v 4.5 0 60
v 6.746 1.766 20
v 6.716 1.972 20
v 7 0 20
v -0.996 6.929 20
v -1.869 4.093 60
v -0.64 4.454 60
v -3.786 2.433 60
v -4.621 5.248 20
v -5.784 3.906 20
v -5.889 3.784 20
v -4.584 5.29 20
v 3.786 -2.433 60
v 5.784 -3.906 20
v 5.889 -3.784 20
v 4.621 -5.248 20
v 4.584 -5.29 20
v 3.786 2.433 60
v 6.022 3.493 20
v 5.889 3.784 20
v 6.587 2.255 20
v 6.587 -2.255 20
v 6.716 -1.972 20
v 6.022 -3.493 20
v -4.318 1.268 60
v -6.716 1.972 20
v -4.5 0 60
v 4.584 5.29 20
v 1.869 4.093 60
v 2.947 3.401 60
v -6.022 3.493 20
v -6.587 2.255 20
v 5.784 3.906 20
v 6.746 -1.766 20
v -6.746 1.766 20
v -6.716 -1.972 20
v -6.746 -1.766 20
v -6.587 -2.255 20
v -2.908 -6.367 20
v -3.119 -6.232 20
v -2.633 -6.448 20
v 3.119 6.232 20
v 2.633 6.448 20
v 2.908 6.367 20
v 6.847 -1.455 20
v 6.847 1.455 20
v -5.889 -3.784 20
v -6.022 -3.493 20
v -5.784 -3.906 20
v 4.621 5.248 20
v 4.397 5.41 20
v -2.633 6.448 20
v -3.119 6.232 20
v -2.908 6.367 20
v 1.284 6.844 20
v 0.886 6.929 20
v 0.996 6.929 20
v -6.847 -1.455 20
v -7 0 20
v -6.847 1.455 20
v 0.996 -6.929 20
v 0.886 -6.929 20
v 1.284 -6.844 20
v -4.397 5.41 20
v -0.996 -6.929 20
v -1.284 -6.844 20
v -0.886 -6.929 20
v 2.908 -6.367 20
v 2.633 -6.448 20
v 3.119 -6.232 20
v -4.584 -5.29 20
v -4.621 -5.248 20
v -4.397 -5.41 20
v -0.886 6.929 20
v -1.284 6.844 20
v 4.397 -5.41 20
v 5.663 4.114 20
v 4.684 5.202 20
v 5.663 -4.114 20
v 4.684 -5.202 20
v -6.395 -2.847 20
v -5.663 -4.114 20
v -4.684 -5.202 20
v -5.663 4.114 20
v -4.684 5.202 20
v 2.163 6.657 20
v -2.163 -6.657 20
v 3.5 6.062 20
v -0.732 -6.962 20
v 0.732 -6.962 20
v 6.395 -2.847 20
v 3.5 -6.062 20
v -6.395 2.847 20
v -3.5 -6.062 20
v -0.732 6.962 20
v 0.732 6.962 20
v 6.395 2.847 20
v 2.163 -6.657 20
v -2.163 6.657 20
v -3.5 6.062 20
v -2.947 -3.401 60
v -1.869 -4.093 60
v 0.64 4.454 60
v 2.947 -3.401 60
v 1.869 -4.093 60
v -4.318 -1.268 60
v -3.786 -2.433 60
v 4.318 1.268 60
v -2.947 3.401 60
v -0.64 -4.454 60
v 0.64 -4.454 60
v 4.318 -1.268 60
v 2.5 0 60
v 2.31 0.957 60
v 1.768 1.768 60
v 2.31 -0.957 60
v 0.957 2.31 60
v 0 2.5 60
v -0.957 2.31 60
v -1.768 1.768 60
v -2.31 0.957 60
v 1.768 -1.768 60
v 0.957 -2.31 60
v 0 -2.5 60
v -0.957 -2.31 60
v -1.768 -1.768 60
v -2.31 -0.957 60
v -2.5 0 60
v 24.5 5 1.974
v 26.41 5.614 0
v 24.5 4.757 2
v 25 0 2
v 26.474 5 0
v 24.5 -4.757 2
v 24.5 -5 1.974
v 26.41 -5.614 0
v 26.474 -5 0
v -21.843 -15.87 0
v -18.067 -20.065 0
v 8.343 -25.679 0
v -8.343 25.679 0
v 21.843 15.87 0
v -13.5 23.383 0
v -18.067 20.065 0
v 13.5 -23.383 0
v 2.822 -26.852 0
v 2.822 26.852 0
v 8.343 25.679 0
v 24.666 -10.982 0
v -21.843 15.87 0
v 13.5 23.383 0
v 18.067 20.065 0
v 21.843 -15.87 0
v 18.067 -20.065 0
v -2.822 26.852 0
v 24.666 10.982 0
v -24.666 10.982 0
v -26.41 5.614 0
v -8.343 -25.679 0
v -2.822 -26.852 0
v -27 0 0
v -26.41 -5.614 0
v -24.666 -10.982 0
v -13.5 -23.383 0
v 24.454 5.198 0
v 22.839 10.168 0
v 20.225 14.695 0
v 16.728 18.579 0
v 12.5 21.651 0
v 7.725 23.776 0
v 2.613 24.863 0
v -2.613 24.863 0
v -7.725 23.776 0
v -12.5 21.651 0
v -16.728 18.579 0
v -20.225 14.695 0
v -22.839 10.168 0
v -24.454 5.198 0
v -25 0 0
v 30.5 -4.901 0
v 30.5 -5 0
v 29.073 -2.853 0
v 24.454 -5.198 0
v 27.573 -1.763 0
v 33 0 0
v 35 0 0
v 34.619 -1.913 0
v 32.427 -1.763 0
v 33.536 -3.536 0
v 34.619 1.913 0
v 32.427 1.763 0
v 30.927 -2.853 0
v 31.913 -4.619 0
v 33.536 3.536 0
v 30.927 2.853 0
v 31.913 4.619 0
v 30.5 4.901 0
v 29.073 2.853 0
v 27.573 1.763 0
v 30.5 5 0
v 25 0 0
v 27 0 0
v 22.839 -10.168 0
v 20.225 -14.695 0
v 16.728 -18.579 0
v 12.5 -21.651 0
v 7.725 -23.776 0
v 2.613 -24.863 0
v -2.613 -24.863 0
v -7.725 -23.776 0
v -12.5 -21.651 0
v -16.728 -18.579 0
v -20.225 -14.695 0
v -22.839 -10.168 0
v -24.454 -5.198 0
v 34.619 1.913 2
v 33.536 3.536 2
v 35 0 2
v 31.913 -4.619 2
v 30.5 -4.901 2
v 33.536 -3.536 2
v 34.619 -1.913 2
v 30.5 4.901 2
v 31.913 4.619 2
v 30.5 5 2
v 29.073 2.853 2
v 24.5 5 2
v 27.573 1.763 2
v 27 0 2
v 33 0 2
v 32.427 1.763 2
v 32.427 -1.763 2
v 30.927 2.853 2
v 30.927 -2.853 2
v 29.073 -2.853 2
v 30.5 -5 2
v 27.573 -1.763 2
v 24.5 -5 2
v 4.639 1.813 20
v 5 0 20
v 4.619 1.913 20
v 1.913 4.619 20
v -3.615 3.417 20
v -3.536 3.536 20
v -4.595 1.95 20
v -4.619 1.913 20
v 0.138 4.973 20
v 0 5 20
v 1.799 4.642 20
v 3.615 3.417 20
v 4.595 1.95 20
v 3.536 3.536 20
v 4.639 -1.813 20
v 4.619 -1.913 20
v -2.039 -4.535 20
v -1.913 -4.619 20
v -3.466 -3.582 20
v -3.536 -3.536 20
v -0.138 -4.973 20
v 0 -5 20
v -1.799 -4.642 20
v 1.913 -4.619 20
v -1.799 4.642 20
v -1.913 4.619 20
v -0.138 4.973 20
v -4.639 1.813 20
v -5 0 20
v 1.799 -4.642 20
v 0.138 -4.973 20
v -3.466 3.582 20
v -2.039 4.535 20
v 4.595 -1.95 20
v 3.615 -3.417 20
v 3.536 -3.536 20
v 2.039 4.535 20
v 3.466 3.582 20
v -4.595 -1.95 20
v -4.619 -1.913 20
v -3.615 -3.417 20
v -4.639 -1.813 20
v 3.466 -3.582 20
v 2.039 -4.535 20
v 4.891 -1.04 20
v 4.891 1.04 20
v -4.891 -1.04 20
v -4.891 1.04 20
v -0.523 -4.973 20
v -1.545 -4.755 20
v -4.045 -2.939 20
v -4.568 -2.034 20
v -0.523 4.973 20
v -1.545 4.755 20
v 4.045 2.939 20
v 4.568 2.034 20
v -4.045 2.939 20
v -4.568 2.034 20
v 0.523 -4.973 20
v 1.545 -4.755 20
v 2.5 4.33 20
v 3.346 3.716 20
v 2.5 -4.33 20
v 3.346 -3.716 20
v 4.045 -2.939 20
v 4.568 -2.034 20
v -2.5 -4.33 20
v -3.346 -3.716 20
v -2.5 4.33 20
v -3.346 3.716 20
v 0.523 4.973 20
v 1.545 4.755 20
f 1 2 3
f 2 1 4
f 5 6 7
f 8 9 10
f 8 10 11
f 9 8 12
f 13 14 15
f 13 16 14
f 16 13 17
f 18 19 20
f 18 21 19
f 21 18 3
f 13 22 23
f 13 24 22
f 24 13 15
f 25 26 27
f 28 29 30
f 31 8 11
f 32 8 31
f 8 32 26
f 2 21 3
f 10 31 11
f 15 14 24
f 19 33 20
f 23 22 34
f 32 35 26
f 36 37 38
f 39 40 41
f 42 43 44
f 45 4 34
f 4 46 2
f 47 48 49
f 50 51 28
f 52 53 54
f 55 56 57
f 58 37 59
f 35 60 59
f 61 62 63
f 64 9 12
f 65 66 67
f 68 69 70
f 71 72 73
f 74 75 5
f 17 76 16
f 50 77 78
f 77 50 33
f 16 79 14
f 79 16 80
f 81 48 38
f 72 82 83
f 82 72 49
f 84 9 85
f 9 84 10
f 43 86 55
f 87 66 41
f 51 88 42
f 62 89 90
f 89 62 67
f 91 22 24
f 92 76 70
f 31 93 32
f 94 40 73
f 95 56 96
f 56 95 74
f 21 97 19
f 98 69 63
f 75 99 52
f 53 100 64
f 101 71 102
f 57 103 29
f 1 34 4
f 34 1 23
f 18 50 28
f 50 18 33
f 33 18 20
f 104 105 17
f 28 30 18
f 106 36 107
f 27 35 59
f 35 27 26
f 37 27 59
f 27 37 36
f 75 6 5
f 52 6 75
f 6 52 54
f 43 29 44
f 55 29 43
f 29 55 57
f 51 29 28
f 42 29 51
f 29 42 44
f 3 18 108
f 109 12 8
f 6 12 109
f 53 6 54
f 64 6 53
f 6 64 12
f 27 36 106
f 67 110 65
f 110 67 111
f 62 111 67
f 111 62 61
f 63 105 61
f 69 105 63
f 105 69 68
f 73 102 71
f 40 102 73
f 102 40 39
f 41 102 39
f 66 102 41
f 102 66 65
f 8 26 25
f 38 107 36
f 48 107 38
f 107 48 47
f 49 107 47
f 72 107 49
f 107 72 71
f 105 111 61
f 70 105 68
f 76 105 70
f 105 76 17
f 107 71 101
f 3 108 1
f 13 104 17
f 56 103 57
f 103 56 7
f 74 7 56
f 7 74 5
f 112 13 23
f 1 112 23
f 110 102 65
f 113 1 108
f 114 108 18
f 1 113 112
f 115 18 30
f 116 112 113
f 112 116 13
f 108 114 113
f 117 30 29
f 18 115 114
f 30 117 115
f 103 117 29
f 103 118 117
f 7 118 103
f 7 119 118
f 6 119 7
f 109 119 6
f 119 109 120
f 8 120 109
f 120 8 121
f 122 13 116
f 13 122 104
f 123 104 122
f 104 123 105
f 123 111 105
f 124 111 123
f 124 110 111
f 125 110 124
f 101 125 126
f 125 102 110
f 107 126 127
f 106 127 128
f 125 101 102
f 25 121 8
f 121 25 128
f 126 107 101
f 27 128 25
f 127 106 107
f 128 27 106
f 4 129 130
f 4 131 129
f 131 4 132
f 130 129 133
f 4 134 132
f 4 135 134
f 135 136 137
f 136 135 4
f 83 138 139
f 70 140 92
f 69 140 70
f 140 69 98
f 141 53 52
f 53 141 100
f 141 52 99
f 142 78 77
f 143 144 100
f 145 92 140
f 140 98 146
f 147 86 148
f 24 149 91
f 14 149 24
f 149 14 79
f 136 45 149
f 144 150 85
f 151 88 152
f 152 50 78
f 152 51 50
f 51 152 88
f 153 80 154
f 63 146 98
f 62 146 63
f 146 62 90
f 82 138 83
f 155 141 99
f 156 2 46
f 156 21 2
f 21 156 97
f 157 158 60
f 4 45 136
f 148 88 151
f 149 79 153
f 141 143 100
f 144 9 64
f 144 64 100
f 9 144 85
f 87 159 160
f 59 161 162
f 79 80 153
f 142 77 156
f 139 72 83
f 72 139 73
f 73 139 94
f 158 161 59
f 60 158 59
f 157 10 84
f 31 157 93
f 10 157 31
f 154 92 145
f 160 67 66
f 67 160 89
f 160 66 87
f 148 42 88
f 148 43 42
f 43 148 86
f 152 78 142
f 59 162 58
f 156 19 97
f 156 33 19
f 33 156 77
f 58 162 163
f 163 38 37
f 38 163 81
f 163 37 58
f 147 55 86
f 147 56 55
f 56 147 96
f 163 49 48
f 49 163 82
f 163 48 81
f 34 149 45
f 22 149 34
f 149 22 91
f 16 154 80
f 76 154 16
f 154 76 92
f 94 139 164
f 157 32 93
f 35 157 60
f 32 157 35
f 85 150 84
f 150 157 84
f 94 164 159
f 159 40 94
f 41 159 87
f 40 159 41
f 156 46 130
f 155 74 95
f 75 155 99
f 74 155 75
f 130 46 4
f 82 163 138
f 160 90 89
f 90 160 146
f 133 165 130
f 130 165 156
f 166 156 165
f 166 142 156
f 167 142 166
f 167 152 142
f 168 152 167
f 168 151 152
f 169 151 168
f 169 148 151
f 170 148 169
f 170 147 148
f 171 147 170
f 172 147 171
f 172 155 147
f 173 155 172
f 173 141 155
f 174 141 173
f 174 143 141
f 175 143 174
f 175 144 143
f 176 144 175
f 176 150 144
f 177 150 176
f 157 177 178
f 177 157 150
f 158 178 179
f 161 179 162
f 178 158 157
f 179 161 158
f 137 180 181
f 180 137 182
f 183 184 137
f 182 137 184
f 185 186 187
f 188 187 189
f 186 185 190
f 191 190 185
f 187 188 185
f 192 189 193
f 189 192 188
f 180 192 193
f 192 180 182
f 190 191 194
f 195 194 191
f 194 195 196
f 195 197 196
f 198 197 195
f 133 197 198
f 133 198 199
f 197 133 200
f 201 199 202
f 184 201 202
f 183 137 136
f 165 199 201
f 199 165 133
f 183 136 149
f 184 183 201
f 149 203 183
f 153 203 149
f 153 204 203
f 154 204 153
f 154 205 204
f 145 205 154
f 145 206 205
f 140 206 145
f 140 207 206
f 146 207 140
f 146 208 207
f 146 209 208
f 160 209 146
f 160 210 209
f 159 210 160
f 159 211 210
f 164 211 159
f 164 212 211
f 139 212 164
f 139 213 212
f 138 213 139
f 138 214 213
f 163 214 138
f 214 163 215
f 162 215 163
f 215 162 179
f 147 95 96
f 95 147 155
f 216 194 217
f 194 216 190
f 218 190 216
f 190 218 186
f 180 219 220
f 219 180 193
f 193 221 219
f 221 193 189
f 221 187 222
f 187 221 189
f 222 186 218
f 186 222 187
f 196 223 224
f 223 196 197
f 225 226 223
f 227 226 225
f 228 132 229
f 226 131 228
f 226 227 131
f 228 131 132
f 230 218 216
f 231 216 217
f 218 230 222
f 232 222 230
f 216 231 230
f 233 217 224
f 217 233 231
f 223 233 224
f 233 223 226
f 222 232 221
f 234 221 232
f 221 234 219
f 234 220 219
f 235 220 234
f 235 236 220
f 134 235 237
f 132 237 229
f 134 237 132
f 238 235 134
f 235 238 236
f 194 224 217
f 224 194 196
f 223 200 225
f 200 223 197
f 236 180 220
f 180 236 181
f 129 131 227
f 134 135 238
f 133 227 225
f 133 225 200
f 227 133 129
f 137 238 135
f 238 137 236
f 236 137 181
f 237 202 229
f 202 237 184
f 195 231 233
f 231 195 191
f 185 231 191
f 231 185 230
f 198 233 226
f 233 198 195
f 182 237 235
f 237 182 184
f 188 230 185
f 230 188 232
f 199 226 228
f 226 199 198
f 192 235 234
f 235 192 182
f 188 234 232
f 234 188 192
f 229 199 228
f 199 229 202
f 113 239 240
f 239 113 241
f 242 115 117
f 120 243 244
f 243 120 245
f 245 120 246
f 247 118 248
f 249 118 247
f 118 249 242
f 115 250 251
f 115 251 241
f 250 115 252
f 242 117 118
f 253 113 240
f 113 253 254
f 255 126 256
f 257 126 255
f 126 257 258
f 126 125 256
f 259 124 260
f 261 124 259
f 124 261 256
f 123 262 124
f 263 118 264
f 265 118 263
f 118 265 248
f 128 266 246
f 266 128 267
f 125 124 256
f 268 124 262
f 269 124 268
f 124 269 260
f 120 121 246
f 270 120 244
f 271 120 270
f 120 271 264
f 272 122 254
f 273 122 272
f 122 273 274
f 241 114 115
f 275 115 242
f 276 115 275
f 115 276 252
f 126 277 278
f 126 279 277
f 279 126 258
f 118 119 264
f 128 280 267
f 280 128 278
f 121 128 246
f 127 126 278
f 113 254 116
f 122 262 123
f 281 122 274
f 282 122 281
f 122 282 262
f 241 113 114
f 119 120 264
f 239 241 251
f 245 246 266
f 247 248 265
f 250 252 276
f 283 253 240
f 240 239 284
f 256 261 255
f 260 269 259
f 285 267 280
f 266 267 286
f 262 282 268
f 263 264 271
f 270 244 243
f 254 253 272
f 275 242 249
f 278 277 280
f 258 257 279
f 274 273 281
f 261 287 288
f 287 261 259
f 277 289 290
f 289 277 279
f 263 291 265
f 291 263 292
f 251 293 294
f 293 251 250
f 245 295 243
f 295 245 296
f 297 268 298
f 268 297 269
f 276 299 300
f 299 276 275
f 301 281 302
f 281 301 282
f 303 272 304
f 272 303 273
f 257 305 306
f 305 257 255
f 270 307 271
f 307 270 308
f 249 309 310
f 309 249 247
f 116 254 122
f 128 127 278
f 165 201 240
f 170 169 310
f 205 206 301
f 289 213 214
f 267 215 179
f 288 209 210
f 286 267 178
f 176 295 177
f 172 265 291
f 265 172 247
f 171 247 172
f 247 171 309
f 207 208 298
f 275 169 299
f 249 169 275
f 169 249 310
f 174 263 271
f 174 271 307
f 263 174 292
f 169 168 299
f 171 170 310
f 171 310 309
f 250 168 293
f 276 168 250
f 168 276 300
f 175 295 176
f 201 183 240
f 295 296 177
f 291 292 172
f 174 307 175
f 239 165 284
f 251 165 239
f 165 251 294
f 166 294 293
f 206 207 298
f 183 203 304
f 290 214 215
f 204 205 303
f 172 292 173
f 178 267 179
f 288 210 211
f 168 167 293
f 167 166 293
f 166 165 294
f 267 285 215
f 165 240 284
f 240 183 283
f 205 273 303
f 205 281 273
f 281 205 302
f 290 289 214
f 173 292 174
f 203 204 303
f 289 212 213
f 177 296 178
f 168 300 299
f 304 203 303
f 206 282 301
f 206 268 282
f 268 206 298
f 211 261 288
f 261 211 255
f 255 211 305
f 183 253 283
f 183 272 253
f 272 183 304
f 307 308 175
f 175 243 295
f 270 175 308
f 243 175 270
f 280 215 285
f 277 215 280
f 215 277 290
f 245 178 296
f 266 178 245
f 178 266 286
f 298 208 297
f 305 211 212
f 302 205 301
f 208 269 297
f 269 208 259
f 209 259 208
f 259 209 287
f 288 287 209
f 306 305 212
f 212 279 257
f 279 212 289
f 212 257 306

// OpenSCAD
// [FL_INDEX: keywords="openscad, 3d_parametric, Customizable_Funnel, csg_solid" | COT="Parametric OpenSCAD design from 3DCodeverse"]
// Title: Customizable Funnel

/*
 * CustomFunnel.scad:  A 3D printable parametric funnel
 * 
 * Written by Steven Morlock, smorloc@gmail.com
 *
 * This script is licensed under the Creative Commons Attribution - Share Alike license:
 *     http://creativecommons.org/licenses/by-sa/3.0/
 *
 */

//preview[view:south,tilt:top]

//CUSTOMIZER VARIABLES

// in millimeters
wall_thickness = 2.0;
// in millimeters
cone_height =  20; //[[1:200]]
// Funnel interior diameter in millimeters
cone_diameter =  50; //[[1:200]]
// in millmeters
neck_height = 40; //[[1:200]]
// Top of neck interior diameter in millimeters
neck_diameter = 10; //[[1:200]]
// Exit hole interiod diameter in millimeters
exit_diameter = 5; //[[1:50]]
// Handle diameter in millmeters
handle_diameter = 10; //[[1:50]]
// Hole in handle diameter in millmeters
handle_hole_diameter = 6; //[[1:50]]

//CUSTOMIZER VARIABLES END

WallThickness = wall_thickness;
NeckHeight = neck_height;
NeckDiameter = neck_diameter;
ConeHeight =  cone_height;
ConeDiameter =  cone_diameter;
ExitDiameter = exit_diameter;
HandleDiameter = handle_diameter;
HandleHoleDiameter = handle_hole_diameter;

makeFunnel();

module makeFunnel()
{
    // Funnel
    difference() {
        union() {
            // Outside of funnel
            funnel(
                    ConeHeight, 
                    ConeDiameter,
                    NeckHeight, 
                    NeckDiameter, 
                    ExitDiameter, 
                    WallThickness);
                    

            // Handle
            translate([ConeDiameter / 2 + WallThickness + HandleHoleDiameter / 2, 0, 0]) {
                difference() {
                    union() {
                        cylinder(WallThickness, r1 = HandleDiameter / 2, r2 = HandleDiameter / 2);
                        translate ([-HandleDiameter / 4, 0, WallThickness / 2]) {
                            cube([HandleHoleDiameter, HandleDiameter, WallThickness], center = true);
                        }
                    }
                    cylinder(WallThickness, r1 = HandleHoleDiameter / 2, r2 = HandleHoleDiameter/ 2);
                }
            }
        }
        
        // Interior of funnel
        funnel(
                ConeHeight, 
                ConeDiameter,
                NeckHeight, 
                NeckDiameter, 
                ExitDiameter, 
                0);
    }
}

module funnel(coneHeight, coneDiameter, neckHeight, neckDiameter, exitDiameter, wallThickness)
{
	union() {
        // Neck
		translate([0, 0, coneHeight]) {
			cylinder(
                    neckHeight, 
                    r1 = neckDiameter/2 + wallThickness, 
                    r2 = exitDiameter/2 + wallThickness);
		}
        // Cone
        cylinder(
                coneHeight, 
                r1 = coneDiameter/2 + wallThickness, 
                r2 = neckDiameter/2 + wallThickness);
	}
}
